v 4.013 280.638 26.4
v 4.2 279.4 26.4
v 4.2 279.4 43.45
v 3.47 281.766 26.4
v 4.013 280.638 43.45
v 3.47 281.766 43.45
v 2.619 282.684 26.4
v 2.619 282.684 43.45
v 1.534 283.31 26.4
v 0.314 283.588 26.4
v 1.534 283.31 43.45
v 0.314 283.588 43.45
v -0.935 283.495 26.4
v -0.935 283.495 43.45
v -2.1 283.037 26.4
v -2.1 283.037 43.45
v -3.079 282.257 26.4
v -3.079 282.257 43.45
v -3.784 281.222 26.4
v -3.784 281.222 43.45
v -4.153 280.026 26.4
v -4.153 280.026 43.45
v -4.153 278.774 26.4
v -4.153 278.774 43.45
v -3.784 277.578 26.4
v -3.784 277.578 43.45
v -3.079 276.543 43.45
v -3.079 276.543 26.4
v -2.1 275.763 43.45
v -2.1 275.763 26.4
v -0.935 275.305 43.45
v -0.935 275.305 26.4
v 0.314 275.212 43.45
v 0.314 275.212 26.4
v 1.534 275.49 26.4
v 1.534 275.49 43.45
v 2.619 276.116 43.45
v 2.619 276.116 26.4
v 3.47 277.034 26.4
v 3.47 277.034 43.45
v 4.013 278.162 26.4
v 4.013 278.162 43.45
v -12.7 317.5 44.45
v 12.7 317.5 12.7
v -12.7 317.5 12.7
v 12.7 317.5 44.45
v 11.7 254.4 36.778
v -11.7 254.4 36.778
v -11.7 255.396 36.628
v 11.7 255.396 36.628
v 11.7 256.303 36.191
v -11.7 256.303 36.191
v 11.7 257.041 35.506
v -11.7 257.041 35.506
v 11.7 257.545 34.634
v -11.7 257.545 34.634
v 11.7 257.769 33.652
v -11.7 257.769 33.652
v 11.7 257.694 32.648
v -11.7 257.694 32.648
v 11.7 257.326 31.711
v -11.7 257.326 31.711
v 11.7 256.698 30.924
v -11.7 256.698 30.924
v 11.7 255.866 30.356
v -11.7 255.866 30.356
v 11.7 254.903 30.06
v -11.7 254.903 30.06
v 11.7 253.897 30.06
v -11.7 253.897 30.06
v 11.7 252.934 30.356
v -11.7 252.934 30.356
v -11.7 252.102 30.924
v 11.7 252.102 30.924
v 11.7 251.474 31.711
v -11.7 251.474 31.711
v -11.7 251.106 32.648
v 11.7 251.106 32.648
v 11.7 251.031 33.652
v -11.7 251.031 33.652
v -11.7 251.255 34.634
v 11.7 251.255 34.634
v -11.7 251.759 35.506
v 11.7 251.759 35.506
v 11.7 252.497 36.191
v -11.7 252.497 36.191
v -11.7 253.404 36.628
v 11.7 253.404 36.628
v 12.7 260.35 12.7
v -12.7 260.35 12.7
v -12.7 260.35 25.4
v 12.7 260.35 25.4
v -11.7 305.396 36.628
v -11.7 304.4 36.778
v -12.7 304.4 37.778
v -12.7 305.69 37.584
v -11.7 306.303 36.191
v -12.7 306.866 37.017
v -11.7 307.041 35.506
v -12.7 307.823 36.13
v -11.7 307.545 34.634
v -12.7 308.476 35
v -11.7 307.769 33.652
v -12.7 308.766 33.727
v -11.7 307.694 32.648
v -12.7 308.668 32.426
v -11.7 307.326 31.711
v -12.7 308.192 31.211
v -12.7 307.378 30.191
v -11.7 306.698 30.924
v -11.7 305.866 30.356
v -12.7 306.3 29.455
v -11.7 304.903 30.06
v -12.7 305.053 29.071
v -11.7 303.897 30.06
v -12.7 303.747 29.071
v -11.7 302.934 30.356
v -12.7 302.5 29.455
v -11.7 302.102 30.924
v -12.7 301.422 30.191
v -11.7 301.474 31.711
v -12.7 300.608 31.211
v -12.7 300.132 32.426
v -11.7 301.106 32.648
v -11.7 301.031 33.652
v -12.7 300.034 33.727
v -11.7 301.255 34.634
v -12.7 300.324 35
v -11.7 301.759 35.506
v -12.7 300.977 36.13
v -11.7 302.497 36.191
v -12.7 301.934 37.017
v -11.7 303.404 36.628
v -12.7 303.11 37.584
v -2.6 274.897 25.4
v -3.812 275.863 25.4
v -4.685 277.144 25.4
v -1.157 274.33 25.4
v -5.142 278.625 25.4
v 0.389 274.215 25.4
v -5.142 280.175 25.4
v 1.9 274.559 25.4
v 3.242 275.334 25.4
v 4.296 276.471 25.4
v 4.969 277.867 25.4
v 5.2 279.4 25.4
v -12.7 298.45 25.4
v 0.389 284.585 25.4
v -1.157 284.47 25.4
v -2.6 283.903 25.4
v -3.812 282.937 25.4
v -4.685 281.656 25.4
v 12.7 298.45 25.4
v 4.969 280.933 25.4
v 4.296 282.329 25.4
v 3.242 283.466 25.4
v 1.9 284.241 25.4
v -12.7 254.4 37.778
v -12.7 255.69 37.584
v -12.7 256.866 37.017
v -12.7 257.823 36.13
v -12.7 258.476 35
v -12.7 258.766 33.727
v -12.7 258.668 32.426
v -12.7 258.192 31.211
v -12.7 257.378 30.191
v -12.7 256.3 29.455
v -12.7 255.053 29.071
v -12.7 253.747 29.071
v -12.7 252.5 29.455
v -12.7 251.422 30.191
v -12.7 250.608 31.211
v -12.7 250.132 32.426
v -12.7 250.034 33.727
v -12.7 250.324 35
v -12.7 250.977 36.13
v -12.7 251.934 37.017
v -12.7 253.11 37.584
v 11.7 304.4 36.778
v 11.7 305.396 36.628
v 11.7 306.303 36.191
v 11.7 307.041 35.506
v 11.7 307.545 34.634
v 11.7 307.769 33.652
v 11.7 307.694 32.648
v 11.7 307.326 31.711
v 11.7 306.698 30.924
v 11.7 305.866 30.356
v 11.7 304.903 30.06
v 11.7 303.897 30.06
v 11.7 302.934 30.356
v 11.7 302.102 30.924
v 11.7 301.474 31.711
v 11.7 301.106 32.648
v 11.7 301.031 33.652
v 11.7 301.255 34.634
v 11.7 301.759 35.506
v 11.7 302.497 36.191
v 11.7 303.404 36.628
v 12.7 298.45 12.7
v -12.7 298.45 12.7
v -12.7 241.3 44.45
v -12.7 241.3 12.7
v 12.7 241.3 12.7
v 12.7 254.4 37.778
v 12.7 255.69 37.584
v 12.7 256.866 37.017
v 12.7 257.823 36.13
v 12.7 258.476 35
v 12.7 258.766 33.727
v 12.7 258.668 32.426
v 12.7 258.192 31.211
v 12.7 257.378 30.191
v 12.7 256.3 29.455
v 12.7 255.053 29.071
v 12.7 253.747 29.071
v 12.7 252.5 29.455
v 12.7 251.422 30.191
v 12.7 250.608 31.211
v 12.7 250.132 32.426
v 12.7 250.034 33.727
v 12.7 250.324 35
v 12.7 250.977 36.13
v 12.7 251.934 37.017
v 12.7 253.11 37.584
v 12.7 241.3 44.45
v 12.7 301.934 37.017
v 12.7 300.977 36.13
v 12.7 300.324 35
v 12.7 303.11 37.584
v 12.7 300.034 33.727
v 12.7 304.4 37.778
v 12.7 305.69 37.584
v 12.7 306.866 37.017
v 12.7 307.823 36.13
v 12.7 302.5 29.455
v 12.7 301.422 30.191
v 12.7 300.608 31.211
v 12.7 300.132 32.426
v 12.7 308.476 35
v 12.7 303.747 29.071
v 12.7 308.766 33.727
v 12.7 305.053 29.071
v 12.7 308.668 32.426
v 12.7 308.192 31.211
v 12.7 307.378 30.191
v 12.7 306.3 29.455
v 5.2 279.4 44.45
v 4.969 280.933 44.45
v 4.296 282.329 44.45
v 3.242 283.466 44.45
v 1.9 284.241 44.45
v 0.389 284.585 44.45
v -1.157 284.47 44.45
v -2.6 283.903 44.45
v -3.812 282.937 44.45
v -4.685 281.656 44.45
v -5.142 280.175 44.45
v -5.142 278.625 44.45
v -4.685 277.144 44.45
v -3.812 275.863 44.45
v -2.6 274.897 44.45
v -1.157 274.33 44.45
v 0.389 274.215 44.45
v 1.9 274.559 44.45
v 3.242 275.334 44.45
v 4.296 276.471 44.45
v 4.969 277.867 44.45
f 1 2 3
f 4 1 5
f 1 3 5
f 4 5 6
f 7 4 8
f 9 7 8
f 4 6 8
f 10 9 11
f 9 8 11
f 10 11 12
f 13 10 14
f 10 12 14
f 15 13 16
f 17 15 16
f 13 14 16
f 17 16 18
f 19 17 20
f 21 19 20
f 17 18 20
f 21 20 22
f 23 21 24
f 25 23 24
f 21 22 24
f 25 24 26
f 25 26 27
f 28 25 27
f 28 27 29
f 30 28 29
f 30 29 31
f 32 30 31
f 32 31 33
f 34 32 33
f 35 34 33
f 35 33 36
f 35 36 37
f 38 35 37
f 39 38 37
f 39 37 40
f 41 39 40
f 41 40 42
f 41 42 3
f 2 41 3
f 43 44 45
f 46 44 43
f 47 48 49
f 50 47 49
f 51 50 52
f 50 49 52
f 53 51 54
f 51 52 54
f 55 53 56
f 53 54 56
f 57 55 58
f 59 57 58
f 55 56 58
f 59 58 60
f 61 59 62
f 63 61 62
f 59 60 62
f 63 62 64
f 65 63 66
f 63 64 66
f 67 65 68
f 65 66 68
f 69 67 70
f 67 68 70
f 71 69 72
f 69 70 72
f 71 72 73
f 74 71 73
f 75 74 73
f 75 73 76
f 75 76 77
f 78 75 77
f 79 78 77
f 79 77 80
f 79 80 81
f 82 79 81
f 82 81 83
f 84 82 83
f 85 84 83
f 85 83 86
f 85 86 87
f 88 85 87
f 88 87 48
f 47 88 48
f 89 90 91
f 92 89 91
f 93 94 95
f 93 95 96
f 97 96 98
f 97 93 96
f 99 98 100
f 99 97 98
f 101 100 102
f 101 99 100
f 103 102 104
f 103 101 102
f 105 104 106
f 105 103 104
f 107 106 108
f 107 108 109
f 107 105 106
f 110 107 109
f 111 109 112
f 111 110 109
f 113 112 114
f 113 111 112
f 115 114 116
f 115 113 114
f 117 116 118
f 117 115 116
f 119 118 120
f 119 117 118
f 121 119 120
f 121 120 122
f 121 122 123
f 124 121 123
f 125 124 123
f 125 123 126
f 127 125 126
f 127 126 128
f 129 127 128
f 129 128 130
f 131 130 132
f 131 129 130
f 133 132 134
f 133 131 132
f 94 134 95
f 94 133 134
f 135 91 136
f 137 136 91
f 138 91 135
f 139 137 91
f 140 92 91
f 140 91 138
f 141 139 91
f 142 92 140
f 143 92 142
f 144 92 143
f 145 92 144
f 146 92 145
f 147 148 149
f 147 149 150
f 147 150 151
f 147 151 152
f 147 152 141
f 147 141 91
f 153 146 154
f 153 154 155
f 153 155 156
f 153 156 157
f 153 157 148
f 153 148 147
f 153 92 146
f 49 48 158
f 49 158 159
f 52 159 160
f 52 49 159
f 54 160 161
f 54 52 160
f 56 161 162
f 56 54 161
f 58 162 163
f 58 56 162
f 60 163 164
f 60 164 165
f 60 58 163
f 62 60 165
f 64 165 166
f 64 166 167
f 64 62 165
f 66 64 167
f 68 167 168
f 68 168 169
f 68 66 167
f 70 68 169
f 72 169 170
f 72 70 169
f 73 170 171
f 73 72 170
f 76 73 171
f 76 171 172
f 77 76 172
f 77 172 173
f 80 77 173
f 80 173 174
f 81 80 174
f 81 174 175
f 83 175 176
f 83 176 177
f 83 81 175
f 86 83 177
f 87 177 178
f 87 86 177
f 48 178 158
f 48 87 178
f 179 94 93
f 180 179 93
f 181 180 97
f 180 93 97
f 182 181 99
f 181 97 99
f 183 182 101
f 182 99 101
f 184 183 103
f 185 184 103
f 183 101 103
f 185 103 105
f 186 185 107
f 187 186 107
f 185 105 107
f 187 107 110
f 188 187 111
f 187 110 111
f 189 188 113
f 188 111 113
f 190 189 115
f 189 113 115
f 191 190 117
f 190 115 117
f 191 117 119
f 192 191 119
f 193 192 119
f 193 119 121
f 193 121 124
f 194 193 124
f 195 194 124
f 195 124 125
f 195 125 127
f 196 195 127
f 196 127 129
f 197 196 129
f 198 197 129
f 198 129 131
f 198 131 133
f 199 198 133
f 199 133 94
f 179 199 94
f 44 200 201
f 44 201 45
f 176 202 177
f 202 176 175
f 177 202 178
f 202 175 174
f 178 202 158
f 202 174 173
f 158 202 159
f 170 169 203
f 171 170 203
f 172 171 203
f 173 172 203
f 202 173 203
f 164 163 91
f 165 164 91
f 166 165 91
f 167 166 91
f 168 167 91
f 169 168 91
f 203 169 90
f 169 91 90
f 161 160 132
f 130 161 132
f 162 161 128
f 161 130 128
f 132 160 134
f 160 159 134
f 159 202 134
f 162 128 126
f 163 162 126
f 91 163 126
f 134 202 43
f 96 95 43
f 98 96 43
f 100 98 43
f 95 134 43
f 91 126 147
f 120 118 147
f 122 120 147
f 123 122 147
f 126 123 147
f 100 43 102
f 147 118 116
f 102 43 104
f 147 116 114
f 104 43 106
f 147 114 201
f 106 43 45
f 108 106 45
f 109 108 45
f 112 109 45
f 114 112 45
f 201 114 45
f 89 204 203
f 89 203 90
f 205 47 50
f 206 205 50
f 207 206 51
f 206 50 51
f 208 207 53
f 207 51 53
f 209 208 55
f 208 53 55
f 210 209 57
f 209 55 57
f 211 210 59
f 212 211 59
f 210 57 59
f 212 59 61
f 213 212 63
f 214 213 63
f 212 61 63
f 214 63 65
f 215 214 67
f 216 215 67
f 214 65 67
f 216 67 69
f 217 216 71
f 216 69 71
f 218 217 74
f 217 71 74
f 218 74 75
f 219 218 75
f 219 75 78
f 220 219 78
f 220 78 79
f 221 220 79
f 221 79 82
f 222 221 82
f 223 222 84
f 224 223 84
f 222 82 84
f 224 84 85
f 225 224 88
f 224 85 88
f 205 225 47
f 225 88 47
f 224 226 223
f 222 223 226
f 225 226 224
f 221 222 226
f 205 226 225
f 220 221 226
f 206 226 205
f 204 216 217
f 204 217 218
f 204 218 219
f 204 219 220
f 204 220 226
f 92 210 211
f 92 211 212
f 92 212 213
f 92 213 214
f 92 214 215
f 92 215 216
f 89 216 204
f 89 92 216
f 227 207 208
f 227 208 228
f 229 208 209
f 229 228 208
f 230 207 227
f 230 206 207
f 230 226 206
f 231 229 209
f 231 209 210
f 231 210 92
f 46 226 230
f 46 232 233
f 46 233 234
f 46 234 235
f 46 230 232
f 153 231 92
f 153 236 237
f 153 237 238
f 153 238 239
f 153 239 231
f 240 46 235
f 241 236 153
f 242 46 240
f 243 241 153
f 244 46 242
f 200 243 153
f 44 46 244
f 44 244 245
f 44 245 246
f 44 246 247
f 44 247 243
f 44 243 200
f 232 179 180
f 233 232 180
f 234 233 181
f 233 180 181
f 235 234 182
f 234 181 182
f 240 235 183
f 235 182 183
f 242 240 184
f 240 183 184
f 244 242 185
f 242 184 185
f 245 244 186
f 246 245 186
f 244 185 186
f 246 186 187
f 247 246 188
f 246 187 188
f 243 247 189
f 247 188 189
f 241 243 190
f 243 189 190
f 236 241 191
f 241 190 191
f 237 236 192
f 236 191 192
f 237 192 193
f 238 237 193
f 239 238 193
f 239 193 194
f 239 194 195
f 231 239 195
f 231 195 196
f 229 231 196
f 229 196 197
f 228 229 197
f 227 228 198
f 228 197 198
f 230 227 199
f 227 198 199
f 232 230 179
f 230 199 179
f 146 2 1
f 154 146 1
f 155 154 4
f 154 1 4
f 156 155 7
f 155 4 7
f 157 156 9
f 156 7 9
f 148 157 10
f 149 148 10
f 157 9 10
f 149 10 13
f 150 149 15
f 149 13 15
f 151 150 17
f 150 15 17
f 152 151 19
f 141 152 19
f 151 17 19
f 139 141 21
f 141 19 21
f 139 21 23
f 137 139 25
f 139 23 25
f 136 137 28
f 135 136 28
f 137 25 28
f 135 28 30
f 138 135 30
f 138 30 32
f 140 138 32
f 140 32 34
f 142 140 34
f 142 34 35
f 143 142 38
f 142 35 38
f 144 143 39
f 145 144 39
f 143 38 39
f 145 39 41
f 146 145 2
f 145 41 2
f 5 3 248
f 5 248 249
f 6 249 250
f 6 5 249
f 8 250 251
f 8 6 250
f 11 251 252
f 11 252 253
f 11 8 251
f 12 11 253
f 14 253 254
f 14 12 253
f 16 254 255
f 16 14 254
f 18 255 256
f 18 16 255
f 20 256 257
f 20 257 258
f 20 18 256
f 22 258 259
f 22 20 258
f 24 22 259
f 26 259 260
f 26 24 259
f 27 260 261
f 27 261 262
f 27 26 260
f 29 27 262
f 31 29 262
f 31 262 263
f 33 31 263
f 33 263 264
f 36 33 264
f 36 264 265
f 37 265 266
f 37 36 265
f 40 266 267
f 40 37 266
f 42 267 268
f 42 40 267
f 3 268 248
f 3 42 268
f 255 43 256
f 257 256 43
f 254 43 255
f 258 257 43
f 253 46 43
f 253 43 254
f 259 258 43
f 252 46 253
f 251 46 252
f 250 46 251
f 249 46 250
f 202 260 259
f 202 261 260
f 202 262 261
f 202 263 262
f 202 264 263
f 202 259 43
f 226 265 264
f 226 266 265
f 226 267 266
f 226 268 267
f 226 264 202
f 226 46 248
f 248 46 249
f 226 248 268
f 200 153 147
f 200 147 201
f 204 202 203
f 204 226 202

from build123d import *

# Parameters (mm, degrees)
BOSS_EXTRUDE1_DEPTH     = 12.7
F_1_4_CLEARANCE_HOLE1_D = 6.7564
M8_CLEARANCE_HOLE1_D    = 8.4
CHAMFER1_SIZE           = 1


with BuildPart() as part:
    # Sketch1 → Boss-Extrude1 (new, symmetric)
    with BuildSketch(Plane(origin=(0, 0, 0), x_dir=(0, 0, -1), z_dir=(1, 0, 0))):
        Polygon((-44.45, 241.3), (-12.7, 241.3), (-12.7, 260.35), (-25.4, 260.35), (-25.4, 298.45), (-12.7, 298.45), (-12.7, 317.5), (-44.45, 317.5), align=None)
    extrude(amount=BOSS_EXTRUDE1_DEPTH, both=True)

    # 1/4 Clearance Hole1 (through all)
    with Locations(Plane(origin=(12.7, 0, 0), x_dir=(0, 0, -1), z_dir=(1, 0, 0))):
        with Locations((-33.4, 304.4), (-33.4, 254.4)):
            Hole(F_1_4_CLEARANCE_HOLE1_D / 2)

    # M8 Clearance Hole1 (through all)
    with Locations(Plane(origin=(0, 0, 25.4), x_dir=(-1, 0, 0), z_dir=(0, 0, -1))):
        with Locations((0, 279.4)):
            Hole(M8_CLEARANCE_HOLE1_D / 2)

    # Chamfer1
    chamfer1_edges = [part.edges().sort_by_distance(p)[0] for p in [
        (12.7, 254.4, 30.0218),
        (-12.7, 254.4, 30.0218),
        (12.7, 304.4, 30.0218),
        (-12.7, 304.4, 30.0218),
        (-4.2, 279.4, 25.4),
        (-4.2, 279.4, 44.45),
    ]]
    chamfer(chamfer1_edges, length=CHAMFER1_SIZE)


solid = part.part
